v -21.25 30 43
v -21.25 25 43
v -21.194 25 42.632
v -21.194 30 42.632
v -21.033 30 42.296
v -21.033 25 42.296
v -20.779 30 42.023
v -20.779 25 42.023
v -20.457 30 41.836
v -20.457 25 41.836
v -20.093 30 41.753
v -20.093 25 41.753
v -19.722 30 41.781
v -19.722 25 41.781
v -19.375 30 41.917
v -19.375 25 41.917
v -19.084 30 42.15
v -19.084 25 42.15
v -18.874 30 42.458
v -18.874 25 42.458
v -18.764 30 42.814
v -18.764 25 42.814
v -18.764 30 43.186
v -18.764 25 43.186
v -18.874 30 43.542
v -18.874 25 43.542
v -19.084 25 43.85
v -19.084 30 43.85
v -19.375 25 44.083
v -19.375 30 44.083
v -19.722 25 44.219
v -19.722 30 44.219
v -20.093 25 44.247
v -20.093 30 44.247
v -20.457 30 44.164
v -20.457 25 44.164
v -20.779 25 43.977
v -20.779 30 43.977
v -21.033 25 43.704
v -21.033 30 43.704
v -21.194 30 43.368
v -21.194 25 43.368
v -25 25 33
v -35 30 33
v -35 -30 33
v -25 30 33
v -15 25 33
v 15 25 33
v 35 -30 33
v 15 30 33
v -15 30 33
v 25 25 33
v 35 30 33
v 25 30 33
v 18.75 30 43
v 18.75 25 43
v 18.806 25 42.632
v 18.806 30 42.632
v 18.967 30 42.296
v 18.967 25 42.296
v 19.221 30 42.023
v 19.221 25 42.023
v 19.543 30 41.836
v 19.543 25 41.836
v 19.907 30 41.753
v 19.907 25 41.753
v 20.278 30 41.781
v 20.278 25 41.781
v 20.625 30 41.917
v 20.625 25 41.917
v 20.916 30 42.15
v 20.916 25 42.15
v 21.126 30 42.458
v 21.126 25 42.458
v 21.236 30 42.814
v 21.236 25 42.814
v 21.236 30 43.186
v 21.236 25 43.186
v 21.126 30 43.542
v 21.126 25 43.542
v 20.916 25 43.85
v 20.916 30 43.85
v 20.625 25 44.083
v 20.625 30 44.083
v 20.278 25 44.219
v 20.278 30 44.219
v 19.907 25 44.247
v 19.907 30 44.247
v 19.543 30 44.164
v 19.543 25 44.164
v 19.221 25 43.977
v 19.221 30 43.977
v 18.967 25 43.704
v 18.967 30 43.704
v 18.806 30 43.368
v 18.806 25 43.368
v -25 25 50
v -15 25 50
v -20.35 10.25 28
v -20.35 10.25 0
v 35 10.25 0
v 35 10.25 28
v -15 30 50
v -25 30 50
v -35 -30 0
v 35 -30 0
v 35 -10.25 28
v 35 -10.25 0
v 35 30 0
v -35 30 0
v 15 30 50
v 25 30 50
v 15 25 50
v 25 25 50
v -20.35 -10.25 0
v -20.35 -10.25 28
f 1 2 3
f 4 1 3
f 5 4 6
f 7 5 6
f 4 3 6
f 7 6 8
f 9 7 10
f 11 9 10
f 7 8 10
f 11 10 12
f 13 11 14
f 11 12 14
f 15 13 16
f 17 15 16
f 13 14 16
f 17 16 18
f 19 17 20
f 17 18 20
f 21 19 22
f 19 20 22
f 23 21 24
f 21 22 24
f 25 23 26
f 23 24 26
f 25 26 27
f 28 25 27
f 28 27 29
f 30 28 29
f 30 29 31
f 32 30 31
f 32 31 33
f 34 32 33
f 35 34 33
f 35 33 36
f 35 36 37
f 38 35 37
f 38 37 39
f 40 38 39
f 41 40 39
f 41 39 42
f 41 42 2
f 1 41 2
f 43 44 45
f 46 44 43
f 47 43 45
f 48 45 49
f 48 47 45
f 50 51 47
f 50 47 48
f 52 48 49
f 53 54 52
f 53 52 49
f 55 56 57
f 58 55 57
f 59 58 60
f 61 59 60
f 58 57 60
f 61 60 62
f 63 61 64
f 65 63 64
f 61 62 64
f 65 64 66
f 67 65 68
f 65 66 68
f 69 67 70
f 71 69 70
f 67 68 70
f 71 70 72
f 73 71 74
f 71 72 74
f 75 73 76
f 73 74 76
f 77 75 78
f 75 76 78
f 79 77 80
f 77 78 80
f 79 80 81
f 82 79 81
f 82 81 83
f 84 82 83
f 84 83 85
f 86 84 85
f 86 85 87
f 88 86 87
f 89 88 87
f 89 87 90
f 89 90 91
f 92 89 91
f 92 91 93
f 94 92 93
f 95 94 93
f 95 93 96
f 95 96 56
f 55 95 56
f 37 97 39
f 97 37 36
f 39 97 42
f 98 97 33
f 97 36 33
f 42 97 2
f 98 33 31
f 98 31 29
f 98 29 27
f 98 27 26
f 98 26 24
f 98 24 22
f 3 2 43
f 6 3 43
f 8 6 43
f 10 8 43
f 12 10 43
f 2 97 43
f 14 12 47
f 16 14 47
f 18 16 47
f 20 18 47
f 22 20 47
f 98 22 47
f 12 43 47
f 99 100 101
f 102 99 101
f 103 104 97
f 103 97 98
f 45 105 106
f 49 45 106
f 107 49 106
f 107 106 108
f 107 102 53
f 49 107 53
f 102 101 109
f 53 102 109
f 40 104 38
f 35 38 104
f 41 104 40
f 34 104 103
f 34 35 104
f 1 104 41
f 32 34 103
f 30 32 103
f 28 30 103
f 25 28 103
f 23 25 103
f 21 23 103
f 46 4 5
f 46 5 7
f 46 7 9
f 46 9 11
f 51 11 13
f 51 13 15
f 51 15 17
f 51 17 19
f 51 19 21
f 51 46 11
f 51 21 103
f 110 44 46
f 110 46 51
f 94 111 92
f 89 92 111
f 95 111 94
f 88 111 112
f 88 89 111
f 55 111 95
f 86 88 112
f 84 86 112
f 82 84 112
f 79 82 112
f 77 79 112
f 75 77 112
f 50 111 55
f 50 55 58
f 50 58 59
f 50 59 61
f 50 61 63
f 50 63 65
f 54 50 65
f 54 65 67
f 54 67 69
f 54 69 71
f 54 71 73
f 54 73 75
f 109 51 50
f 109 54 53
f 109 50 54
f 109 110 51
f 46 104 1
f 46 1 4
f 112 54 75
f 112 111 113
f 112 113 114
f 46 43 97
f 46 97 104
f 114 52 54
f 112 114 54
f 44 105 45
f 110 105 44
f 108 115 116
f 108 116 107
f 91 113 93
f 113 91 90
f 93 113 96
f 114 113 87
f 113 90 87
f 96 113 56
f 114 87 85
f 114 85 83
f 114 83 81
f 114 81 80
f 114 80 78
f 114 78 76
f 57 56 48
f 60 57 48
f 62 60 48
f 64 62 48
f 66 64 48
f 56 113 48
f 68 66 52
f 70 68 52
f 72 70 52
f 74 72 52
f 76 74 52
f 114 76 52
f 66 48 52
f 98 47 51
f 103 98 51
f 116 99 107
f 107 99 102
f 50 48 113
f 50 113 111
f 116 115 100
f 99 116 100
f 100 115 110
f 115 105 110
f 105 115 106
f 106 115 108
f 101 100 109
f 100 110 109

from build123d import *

# Parameters (mm, degrees)
SKETCH_2_W          = 70
SKETCH_2_H          = 60
EXTRUDE_2_DEPTH     = 33
SKETCH_3_W          = 40.7
SKETCH_3_H          = 20.5
CUT_EXTRUDE_1_DEPTH = 28
SKETCH_4_W          = 14.65
SKETCH_4_H          = 20.5
EXTRUDE_3_DEPTH     = 28
SKETCH_5_W          = 14.65
SKETCH_5_H          = 20.5
CUT_EXTRUDE_4_DEPTH = 28
SKETCH_8_W          = 10
SKETCH_8_H          = 5
EXTRUDE_5_DEPTH     = 50
M3X0_5_1_D          = 2.5


with BuildPart() as part:
    # ｽｹｯﾁ2 → ﾎﾞｽ - 押し出し2 (new body)
    with BuildSketch(Plane.XY):
        Rectangle(SKETCH_2_W, SKETCH_2_H)
    extrude(amount=EXTRUDE_2_DEPTH)

    # ｽｹｯﾁ3 → ｶｯﾄ - 押し出し1 (cut)
    with BuildSketch(Plane.XY):
        Rectangle(SKETCH_3_W, SKETCH_3_H)
    extrude(amount=CUT_EXTRUDE_1_DEPTH, mode=Mode.SUBTRACT)

    # ｽｹｯﾁ4 → ﾎﾞｽ - 押し出し3 (add)
    with BuildSketch(Plane.XY):
        with Locations((27.675, 0)):
            Rectangle(SKETCH_4_W, SKETCH_4_H)
    extrude(amount=EXTRUDE_3_DEPTH)

    # ｽｹｯﾁ5 → ｶｯﾄ - 押し出し4 (cut)
    with BuildSketch(Plane.XY):
        with Locations((27.675, 0)):
            Rectangle(SKETCH_5_W, SKETCH_5_H)
    extrude(amount=CUT_EXTRUDE_4_DEPTH, mode=Mode.SUBTRACT)

    # ｽｹｯﾁ8 → ﾎﾞｽ - 押し出し5 (add)
    with BuildSketch(Plane.XY):
        with Locations((-20, 27.5)):
            Rectangle(SKETCH_8_W, SKETCH_8_H)
        with Locations((20, 27.5)):
            Rectangle(SKETCH_8_W, SKETCH_8_H)
    extrude(amount=EXTRUDE_5_DEPTH)

    # M3x0.5 ねじ穴1 (through all)
    with Locations(Plane(origin=(0, 30, 0), x_dir=(1, 0, 0), z_dir=(0, 1, 0))):
        with Locations((-20, -43), (20, -43)):
            Hole(M3X0_5_1_D / 2)


solid = part.part
